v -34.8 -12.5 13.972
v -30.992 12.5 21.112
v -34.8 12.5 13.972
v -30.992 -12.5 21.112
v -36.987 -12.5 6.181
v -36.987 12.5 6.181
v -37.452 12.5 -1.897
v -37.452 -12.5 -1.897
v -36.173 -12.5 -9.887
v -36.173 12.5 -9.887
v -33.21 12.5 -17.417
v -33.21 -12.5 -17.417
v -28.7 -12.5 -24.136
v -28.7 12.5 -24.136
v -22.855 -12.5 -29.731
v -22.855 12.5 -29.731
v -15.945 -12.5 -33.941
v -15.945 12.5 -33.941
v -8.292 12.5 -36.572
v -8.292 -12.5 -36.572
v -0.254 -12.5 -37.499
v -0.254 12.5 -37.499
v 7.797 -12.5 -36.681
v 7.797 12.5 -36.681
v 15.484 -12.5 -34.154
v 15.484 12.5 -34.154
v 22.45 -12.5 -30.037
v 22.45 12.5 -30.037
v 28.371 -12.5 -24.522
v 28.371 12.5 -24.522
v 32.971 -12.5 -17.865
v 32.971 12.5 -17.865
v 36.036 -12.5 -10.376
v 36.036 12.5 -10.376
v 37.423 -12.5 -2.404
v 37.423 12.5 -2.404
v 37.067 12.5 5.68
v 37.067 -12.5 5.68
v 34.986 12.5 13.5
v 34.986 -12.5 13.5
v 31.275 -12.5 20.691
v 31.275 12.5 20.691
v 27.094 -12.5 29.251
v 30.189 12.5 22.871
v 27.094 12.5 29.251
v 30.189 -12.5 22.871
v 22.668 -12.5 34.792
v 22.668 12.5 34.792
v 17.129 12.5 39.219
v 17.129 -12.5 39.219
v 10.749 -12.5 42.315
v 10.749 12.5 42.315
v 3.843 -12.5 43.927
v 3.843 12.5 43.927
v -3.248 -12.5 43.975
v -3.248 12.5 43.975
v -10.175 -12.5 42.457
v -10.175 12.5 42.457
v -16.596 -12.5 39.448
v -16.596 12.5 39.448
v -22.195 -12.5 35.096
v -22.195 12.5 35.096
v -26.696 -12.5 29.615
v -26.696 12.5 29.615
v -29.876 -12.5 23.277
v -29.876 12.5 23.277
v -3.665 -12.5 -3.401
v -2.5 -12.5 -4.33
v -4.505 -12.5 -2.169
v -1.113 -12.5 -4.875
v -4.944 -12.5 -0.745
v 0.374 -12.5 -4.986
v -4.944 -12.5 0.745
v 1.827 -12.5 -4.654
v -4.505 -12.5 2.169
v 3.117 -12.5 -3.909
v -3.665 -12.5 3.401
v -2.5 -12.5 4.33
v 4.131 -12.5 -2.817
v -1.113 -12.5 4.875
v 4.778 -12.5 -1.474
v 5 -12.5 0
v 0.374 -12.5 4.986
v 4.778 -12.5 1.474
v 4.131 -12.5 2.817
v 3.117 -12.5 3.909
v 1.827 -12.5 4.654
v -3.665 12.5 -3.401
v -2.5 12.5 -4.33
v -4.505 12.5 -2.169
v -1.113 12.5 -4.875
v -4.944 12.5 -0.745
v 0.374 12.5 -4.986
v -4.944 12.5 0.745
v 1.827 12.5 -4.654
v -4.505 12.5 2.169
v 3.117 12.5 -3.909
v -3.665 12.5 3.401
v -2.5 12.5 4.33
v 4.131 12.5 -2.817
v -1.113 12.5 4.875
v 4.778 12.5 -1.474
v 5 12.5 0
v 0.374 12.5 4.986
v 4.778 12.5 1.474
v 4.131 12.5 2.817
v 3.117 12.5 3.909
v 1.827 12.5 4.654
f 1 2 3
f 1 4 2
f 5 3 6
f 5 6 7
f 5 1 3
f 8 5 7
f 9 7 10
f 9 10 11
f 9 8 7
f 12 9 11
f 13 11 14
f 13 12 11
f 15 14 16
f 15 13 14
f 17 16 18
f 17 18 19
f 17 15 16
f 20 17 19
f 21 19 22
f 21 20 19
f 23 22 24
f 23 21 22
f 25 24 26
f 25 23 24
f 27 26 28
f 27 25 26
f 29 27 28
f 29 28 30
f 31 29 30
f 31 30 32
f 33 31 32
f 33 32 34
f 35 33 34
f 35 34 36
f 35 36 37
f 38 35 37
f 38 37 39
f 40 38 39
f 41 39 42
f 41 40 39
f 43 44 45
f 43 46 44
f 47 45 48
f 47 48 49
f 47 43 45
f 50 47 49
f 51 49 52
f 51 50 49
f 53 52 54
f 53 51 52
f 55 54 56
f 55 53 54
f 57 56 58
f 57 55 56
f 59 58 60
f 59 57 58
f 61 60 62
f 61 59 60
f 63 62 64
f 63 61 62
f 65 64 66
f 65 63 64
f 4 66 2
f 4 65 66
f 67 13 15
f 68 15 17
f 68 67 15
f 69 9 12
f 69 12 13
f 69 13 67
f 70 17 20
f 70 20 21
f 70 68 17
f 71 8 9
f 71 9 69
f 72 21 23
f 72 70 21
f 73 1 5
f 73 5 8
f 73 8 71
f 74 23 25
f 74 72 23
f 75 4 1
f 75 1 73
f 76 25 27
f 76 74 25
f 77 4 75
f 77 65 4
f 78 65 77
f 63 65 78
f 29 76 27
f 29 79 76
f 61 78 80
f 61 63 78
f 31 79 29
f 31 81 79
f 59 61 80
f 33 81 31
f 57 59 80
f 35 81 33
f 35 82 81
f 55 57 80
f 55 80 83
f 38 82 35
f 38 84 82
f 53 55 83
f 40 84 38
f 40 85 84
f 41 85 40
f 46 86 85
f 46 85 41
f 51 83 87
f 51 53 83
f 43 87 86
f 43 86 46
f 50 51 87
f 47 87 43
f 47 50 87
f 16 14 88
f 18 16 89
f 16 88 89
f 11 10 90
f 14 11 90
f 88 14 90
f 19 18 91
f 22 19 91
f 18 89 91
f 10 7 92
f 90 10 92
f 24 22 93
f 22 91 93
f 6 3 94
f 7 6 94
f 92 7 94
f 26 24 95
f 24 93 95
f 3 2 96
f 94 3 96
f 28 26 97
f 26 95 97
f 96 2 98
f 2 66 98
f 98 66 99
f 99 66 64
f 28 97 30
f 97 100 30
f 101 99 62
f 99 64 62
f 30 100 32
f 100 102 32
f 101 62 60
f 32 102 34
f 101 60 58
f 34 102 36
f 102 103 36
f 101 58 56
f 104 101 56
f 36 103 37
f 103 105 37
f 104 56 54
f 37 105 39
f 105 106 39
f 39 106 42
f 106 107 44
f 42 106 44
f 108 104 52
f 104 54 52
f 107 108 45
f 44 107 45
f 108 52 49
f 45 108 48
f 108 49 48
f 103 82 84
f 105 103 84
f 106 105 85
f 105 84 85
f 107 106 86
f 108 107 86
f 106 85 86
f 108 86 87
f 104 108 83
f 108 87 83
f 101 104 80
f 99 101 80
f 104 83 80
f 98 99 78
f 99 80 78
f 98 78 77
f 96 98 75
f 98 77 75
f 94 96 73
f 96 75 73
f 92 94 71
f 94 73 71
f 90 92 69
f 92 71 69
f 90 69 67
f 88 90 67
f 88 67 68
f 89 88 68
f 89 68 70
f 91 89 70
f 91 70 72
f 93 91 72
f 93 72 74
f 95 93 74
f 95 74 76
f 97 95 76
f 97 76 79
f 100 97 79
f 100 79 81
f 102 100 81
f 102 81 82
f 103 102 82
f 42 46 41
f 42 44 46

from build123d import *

# Parameters (mm, degrees)
F1_DEPTH = 12.5
F2_R     = 10
F3_R     = 5
F4_DEPTH = 25.0010001


with BuildPart() as f1:
    # F0 (on Front) → F1 (new body, symmetric)
    with BuildSketch(Plane.XZ):
        with BuildLine():
            ThreePointArc((30.5734569437, 21.7143669149), (0.2987295857, 44.1480604907), (-30.2768086166, 22.1261126273))
            ThreePointArc((-30.2768086166, 22.1261126273), (-0.2537394144, -37.499141541), (30.5734569437, 21.7143669149))
        make_face()
    extrude(amount=F1_DEPTH, both=True)

    # F2
    f2_edges = [f1.edges().sort_by_distance(p)[0] for p in [
        (-30.276809, 0, 22.126113),
        (30.573457, 0, 21.714367),
    ]]
    fillet(f2_edges, radius=F2_R)

    # F3 (on face) → F4 (cut, through all)
    with BuildSketch(Plane.XZ.offset(12.5)):
        Circle(F3_R)
    extrude(amount=-F4_DEPTH, mode=Mode.SUBTRACT)


solid = f1.part
